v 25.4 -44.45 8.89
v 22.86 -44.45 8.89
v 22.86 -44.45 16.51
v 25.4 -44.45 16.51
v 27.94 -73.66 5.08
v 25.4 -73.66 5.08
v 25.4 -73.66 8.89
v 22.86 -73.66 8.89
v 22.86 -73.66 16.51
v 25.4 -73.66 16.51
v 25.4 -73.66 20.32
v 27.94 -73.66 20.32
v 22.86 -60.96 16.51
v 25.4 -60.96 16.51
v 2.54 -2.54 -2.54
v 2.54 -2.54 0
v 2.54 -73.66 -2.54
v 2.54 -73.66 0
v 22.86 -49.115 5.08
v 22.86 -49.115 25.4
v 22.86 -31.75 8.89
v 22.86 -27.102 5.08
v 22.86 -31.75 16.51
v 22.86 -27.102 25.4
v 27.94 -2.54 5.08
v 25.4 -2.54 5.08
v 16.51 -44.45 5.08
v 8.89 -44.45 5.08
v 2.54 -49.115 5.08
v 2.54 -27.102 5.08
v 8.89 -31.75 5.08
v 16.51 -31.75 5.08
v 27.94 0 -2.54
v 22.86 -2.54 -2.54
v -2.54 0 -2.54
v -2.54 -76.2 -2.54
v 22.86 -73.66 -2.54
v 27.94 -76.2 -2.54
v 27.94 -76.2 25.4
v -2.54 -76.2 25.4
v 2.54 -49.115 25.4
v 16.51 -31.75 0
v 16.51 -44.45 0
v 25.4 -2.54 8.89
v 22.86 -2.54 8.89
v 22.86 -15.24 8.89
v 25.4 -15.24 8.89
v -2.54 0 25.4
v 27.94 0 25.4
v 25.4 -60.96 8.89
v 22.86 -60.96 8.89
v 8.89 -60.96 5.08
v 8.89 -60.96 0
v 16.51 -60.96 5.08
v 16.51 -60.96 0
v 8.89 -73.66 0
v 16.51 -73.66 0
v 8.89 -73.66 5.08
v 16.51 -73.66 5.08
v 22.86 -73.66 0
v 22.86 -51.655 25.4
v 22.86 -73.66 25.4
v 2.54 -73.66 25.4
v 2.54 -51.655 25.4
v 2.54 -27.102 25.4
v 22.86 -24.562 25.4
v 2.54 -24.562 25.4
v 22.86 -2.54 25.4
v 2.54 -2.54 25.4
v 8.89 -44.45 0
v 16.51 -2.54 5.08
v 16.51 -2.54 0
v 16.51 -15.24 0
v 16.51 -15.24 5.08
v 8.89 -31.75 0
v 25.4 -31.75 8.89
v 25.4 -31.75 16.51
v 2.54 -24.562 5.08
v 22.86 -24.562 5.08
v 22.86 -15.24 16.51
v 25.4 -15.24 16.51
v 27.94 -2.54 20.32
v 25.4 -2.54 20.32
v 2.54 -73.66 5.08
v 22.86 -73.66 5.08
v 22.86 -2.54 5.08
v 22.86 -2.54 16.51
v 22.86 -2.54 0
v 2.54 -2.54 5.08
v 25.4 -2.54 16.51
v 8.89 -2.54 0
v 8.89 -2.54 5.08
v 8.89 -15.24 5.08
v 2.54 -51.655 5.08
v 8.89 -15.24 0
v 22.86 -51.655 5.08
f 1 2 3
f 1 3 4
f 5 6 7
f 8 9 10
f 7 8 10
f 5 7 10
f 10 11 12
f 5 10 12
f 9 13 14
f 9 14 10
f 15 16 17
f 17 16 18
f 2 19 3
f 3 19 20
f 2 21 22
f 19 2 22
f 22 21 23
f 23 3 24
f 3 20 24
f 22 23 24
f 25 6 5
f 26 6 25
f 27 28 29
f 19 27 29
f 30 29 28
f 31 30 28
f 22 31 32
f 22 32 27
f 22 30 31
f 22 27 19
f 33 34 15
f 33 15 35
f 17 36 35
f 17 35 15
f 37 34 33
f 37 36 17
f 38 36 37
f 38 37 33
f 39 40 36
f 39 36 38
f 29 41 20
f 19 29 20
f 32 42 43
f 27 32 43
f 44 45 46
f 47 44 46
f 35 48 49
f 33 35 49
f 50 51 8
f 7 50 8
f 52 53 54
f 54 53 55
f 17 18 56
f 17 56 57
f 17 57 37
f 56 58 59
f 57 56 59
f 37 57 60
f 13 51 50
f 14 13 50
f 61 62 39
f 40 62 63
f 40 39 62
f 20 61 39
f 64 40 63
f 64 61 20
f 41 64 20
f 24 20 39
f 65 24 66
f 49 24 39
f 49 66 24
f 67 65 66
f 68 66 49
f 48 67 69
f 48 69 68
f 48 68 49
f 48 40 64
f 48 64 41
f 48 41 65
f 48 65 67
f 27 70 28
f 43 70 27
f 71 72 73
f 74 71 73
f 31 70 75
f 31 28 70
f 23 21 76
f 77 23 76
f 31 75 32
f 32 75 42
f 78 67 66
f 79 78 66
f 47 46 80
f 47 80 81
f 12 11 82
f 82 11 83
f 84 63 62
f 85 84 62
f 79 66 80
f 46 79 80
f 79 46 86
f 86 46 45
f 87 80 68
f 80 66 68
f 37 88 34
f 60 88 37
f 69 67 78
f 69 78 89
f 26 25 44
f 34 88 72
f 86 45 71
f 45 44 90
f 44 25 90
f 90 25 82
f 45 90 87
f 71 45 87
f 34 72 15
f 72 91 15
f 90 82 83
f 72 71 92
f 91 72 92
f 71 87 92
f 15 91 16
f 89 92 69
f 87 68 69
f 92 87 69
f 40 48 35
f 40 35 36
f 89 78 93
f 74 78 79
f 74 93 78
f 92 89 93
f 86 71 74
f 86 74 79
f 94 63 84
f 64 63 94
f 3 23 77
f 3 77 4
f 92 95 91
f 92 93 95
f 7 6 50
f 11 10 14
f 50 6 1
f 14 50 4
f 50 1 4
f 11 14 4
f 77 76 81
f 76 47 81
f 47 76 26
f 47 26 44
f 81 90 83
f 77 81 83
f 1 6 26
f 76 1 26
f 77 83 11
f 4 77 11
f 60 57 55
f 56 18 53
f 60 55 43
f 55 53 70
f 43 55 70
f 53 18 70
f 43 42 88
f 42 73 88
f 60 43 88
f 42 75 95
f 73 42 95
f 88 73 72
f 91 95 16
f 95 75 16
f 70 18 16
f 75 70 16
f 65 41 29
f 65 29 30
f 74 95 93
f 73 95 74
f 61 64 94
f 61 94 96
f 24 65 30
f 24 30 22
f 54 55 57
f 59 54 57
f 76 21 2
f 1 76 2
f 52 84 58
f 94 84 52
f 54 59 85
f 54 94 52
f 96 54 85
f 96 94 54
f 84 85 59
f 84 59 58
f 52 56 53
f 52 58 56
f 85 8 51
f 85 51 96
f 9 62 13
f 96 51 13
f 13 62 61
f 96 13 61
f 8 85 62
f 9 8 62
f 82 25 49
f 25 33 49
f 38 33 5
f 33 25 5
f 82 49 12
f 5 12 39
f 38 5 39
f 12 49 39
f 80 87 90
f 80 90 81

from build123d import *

# Parameters (mm, degrees)
F0_W      = 25.4
F0_H      = 25.4
F1_DEPTH  = 76.2
F2_W      = 5.08
F2_H      = 7.62
F3_DEPTH  = 25.4
F4_W      = 76.2
F4_H      = 25.4
F4_W_2    = 71.12
F4_H_2    = 15.24
F5_DEPTH  = 2.54
F6_W      = 76.2
F6_H      = 25.4
F6_W_2    = 71.12
F6_H_2    = 15.24
F7_DEPTH  = 2.54
F8_W      = 5.08
F8_H      = 7.62
F8_W_2    = 2.54
F8_W_3    = 3.81
F9_DEPTH  = 25.4
F10_W     = 7.62
F10_H     = 12.7
F11_DEPTH = 25.4
F12_W     = 2.54
F12_H     = 71.12
F13_DEPTH = 2.54
F14_W     = 71.12
F14_H     = 15.24
F15_DEPTH = 2.54
F16_W     = 12.7
F16_H     = 7.62
F17_DEPTH = 8.89
F18_W     = 12.7
F18_H     = 7.62
F19_DEPTH = 8.89
F20_W     = 12.7
F20_H     = 7.62
F21_DEPTH = 8.89
F22_W     = 20.32
F22_H     = 22.0218
F22_H_2   = 22.013333
F22_H_3   = 22.004867
F23_DEPTH = 20.32
F25_W     = 76.2
F25_H     = 2.54
F26_DEPTH = 2.54
F27_W     = 2.54
F27_H     = 76.2
F28_DEPTH = 2.54


with BuildPart() as f1:
    # F0 (on Front) → F1 (new body)
    with BuildSketch(Plane.XZ):
        with Locations((12.7, 12.7)):
            Rectangle(F0_W, F0_H)
    extrude(amount=F1_DEPTH)

    # F2 (on face) → F3 (cut)
    with BuildSketch(Plane(origin=(0, 0, 0), x_dir=(0, -1, 0), z_dir=(-1, 0, 0))):
        with Locations((7.62, 12.7)):
            Rectangle(F2_W, F2_H)
        with Locations((38.1, 12.7)):
            Rectangle(F2_W, F2_H)
        with Locations((68.58, 12.7)):
            Rectangle(F2_W, F2_H)
    extrude(amount=-F3_DEPTH, mode=Mode.SUBTRACT)

    # F4 (on face) → F5 (join)
    with BuildSketch(Plane(origin=(0, 0, 0), x_dir=(0, -1, 0), z_dir=(-1, 0, 0))):
        with Locations((38.1, 12.7)):
            Rectangle(F4_W, F4_H)
        with Locations((38.1, 12.7)):
            Rectangle(F4_W_2, F4_H_2, mode=Mode.SUBTRACT)
    extrude(amount=F5_DEPTH)

    # F6 (on face) → F7 (join)
    with BuildSketch(Plane.YZ.offset(25.4)):
        with Locations((-38.1, 12.7)):
            Rectangle(F6_W, F6_H)
        with Locations((-38.1, 12.7)):
            Rectangle(F6_W_2, F6_H_2, mode=Mode.SUBTRACT)
    extrude(amount=F7_DEPTH)

    # F8 (on face) → F9 (cut)
    with BuildSketch(Plane(origin=(0, 0, 0), x_dir=(0, -1, 0), z_dir=(-1, 0, 0))):
        with Locations((12.7, 12.7)):
            Rectangle(F8_W, F8_H)
        with Locations((3.81, 12.7)):
            Rectangle(F8_W_2, F8_H)
        with Locations((33.655, 12.7)):
            Rectangle(F8_W_3, F8_H)
        with Locations((42.545, 12.7)):
            Rectangle(F8_W_3, F8_H)
        with Locations((63.5, 12.7)):
            Rectangle(F8_W, F8_H)
        with Locations((72.39, 12.7)):
            Rectangle(F8_W_2, F8_H)
    extrude(amount=-F9_DEPTH, mode=Mode.SUBTRACT)

    # F10 (on face) → F11 (cut)
    with BuildSketch(Plane(origin=(0, 0, 0), x_dir=(1, 0, 0), z_dir=(0, 0, -1))):
        with Locations((12.7, 8.89)):
            Rectangle(F10_W, F10_H)
        with Locations((12.7, 38.1)):
            Rectangle(F10_W, F10_H)
        with Locations((12.7, 67.31)):
            Rectangle(F10_W, F10_H)
    extrude(amount=-F11_DEPTH, mode=Mode.SUBTRACT)

    # F12 (on face) → F13 (join)
    with BuildSketch(Plane(origin=(0, 0, 0), x_dir=(1, 0, 0), z_dir=(0, 0, -1))):
        Polygon((0, 76.2), (0, 73.66), (2.54, 73.66), (22.86, 73.66), (25.4, 73.66), (25.4, 76.2), align=None)
        with Locations((1.27, 38.1)):
            Rectangle(F12_W, F12_H)
        with Locations((24.13, 38.1)):
            Rectangle(F12_W, F12_H)
        Polygon((2.54, 2.54), (0, 2.54), (0, 0), (25.4, 0), (25.4, 2.54), (22.86, 2.54), align=None)
    extrude(amount=F13_DEPTH)

    # F14 (on face) → F15 (join)
    with BuildSketch(Plane(origin=(0, 0, 0), x_dir=(0, -1, 0), z_dir=(-1, 0, 0))):
        with Locations((38.1, 12.7)):
            Rectangle(F14_W, F14_H)
    extrude(amount=F15_DEPTH)

    # F16 (on face) → F17 (join)
    with BuildSketch(Plane.YZ):
        with Locations((-38.1, 12.7)):
            Rectangle(F16_W, F16_H)
    extrude(amount=F17_DEPTH)

    # F18 (on face) → F19 (join)
    with BuildSketch(Plane.YZ):
        with Locations((-67.31, 12.7)):
            Rectangle(F18_W, F18_H)
    extrude(amount=F19_DEPTH)

    # F20 (on face) → F21 (join)
    with BuildSketch(Plane.YZ):
        with Locations((-8.89, 12.7)):
            Rectangle(F20_W, F20_H)
    extrude(amount=F21_DEPTH)

    # F22 (on face) → F23 (cut)
    with BuildSketch(Plane.XY.offset(25.4)):
        with Locations((12.7, -13.5509)):
            Rectangle(F22_W, F22_H)
        with Locations((12.7, -38.108466)):
            Rectangle(F22_W, F22_H_2)
        with Locations((12.7, -62.657567)):
            Rectangle(F22_W, F22_H_3)
    extrude(amount=-F23_DEPTH, mode=Mode.SUBTRACT)

    # F25 (on face) → F26 (join)
    with BuildSketch(Plane(origin=(0, 0, 0), x_dir=(0, -1, 0), z_dir=(-1, 0, 0))):
        with Locations((38.1, -1.27)):
            Rectangle(F25_W, F25_H)
    extrude(amount=F26_DEPTH)

    # F27 (on face) → F28 (join)
    with BuildSketch(Plane(origin=(0, 0, 0), x_dir=(1, 0, 0), z_dir=(0, 0, -1))):
        with Locations((26.67, 38.1)):
            Rectangle(F27_W, F27_H)
    extrude(amount=F28_DEPTH)


solid = f1.part
